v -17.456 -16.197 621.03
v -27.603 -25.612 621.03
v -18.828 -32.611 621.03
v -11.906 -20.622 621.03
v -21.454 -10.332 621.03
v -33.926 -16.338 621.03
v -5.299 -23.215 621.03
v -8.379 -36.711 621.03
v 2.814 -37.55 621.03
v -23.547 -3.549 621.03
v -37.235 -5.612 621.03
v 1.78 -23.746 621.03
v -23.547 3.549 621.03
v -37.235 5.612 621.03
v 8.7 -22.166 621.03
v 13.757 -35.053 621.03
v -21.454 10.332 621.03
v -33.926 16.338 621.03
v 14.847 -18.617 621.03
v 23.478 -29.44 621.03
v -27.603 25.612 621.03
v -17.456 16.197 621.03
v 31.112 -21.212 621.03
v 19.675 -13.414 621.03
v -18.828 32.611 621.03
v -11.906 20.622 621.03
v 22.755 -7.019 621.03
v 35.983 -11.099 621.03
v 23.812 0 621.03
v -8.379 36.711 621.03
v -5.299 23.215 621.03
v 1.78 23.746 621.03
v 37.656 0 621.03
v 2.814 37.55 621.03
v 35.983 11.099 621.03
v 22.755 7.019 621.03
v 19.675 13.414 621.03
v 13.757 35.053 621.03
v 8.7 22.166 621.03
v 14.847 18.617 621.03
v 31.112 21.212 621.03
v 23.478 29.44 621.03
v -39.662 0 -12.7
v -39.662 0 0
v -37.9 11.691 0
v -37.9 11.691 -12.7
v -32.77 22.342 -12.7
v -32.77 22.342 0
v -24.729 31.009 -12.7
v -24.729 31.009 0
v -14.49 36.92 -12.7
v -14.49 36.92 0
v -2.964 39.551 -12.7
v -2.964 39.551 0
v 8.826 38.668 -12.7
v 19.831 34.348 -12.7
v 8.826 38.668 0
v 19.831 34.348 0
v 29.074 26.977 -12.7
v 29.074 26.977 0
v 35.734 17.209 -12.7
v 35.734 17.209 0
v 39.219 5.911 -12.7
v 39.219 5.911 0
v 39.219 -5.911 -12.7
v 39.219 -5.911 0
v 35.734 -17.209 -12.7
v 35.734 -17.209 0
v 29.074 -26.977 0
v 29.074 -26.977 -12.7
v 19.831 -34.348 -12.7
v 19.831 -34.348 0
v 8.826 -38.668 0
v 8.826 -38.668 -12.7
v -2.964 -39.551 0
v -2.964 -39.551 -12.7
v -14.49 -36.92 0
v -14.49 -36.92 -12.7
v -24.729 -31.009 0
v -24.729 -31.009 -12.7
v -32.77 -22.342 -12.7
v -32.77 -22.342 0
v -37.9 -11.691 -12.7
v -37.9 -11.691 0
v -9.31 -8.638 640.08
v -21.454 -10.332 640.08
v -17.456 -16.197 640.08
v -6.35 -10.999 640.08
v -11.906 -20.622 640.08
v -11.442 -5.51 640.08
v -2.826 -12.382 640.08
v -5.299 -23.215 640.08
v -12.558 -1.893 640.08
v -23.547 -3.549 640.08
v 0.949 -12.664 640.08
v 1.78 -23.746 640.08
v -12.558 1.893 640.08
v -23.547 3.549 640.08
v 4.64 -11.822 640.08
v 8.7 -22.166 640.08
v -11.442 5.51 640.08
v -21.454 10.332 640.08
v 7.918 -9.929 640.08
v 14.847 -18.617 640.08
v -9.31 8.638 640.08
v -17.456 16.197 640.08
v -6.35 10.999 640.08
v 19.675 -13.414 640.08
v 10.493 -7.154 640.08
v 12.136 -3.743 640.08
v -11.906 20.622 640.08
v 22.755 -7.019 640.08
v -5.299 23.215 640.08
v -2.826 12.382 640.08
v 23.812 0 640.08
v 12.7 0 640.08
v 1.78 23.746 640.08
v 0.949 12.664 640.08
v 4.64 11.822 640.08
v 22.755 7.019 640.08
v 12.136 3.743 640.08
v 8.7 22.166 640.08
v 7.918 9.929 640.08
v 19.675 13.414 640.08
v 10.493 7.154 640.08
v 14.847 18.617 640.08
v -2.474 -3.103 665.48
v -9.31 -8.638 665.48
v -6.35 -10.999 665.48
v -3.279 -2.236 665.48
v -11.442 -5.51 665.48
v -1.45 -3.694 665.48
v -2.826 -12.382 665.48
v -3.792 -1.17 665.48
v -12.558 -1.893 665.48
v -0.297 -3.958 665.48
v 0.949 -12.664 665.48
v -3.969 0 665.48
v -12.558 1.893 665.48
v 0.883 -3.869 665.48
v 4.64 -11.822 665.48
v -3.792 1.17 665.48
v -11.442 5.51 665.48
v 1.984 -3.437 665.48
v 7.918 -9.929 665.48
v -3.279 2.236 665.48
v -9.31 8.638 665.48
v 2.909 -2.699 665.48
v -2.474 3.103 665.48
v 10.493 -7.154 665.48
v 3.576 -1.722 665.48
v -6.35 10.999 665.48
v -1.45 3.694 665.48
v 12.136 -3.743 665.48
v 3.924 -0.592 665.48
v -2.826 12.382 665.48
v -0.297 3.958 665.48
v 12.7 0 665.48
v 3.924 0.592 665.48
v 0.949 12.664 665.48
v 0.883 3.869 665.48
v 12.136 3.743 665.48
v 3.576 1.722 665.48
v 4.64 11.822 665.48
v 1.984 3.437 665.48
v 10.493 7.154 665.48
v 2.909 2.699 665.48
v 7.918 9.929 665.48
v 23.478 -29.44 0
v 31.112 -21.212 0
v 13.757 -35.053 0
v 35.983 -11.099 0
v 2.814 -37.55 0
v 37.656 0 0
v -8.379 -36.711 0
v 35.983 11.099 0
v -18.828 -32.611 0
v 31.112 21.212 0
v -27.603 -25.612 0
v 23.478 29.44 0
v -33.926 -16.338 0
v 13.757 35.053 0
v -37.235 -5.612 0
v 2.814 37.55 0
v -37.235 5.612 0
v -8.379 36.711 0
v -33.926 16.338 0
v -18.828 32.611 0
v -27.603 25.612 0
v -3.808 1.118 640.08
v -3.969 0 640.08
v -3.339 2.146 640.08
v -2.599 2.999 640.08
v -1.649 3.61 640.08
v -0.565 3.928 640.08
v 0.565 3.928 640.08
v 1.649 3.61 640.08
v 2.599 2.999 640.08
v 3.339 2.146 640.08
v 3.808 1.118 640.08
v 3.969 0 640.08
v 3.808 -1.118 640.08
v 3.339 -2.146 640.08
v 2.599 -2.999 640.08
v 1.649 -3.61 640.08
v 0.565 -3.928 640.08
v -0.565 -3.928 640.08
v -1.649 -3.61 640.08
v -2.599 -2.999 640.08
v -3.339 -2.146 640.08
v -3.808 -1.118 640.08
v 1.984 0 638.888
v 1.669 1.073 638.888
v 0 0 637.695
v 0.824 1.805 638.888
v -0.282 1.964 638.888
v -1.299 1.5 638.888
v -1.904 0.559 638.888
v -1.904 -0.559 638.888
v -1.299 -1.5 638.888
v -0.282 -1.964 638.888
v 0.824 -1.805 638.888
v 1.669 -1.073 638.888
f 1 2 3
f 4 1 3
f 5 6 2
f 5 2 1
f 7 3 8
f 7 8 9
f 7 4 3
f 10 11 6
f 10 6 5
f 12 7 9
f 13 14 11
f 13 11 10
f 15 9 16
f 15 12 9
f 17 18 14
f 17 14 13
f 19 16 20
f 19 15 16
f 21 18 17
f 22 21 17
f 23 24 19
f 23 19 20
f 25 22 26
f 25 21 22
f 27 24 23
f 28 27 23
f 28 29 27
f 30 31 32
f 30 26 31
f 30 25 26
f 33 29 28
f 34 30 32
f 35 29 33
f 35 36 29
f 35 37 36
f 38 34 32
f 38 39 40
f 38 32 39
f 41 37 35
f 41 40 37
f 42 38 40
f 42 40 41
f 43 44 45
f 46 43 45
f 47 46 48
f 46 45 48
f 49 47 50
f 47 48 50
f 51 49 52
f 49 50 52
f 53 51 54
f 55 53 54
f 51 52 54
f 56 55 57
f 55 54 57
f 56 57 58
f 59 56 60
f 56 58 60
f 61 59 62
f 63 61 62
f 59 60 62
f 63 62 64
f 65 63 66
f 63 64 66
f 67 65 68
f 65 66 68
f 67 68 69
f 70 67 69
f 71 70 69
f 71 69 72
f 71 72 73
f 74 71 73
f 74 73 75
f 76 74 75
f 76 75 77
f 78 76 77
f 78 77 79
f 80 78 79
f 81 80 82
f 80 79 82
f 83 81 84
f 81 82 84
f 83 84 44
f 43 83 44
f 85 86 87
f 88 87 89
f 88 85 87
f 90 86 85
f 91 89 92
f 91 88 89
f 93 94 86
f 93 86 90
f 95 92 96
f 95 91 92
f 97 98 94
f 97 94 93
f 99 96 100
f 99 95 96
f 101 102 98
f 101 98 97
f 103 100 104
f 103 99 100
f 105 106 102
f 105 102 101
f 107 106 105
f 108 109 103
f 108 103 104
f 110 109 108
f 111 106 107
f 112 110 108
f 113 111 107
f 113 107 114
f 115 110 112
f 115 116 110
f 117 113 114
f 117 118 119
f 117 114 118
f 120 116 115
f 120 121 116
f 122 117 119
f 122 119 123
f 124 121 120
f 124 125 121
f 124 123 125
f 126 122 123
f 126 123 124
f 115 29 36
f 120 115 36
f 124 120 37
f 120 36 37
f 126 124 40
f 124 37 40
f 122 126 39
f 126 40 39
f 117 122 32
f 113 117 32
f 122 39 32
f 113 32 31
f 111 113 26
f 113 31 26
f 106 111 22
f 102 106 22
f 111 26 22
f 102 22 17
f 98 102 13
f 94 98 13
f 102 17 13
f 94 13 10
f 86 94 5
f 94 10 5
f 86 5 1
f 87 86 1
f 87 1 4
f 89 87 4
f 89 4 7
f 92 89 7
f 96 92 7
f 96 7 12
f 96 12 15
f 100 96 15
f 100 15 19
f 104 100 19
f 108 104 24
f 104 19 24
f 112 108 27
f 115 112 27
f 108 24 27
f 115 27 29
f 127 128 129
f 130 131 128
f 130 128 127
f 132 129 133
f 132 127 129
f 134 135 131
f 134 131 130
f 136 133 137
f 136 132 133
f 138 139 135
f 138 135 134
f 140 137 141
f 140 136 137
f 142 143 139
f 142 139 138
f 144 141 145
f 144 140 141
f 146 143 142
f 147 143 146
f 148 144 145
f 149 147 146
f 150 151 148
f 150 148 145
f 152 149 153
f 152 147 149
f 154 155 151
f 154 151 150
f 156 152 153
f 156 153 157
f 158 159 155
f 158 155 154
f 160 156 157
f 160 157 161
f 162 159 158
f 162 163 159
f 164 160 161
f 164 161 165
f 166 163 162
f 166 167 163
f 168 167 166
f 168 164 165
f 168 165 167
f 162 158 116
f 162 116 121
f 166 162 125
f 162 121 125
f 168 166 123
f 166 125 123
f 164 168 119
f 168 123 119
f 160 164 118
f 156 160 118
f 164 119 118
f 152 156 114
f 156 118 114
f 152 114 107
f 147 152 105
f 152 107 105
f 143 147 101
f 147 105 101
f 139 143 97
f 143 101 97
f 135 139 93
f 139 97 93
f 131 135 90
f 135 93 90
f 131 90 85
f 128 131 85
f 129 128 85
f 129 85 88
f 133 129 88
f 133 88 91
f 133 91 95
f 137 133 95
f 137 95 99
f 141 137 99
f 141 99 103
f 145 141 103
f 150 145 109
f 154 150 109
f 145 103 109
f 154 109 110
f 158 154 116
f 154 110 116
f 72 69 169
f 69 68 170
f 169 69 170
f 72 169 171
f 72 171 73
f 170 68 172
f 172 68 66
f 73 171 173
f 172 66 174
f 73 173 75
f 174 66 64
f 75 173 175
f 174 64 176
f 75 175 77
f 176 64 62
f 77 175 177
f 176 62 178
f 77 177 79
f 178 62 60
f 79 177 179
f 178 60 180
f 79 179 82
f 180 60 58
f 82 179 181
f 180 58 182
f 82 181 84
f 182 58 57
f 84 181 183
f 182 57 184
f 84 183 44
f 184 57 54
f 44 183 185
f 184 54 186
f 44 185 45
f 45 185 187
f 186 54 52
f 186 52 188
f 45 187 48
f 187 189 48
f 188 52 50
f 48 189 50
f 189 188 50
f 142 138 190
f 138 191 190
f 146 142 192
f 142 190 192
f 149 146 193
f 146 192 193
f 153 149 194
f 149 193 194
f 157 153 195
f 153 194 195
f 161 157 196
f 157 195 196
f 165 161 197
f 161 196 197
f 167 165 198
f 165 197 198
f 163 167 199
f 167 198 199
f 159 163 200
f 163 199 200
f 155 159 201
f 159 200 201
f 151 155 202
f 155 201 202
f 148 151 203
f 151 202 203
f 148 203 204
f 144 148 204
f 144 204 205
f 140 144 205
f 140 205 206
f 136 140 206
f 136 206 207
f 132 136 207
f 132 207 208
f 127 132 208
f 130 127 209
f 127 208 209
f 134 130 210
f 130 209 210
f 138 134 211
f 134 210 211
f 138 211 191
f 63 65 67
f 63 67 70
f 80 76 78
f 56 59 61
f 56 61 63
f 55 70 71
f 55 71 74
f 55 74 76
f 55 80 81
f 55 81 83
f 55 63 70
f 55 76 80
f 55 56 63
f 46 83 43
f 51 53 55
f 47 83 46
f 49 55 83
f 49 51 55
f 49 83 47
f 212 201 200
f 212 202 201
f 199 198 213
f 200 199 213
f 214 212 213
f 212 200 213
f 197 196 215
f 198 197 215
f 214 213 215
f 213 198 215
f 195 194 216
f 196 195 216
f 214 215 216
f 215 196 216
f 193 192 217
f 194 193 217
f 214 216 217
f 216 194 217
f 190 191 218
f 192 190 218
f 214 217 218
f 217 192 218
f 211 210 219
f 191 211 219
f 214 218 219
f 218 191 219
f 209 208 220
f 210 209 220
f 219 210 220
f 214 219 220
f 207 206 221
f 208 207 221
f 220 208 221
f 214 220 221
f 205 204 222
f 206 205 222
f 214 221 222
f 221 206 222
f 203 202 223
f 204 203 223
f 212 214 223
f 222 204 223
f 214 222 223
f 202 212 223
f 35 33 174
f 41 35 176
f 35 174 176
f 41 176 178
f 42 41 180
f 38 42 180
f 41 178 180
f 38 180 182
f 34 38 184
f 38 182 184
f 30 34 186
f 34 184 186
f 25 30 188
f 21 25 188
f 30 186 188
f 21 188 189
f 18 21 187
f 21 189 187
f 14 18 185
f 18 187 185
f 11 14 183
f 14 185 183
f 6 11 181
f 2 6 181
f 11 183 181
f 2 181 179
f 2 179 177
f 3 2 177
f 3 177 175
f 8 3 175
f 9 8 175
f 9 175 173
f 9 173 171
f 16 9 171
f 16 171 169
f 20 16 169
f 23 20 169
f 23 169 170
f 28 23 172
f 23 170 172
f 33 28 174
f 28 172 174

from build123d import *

# Parameters (mm, degrees)
SKETCH1_R                   = 37.6555
BOSS_EXTRUDE1_DEPTH         = 621.03
SKETCH2_R                   = 39.6621
BOSS_EXTRUDE2_DEPTH         = 12.7
SKETCH4_R                   = 23.8125
BOSS_EXTRUDE4_DEPTH         = 19.05
SKETCH5_R                   = 12.7
BOSS_EXTRUDE5_DEPTH         = 25.4
F_3_8_16_TAPPED_HOLE1_D     = 7.9375
F_3_8_16_TAPPED_HOLE1_DEPTH = 25.4
F_3_8_16_TAPPED_HOLE1_TIP   = 2.384665582


with BuildPart() as part:
    # Sketch1 → Boss-Extrude1 (new body)
    with BuildSketch(Plane.XY):
        Circle(SKETCH1_R)
    extrude(amount=BOSS_EXTRUDE1_DEPTH)

    # Sketch2 → Boss-Extrude2 (add)
    with BuildSketch(Plane(origin=(0, 0, 0), x_dir=(-1, 0, 0), z_dir=(0, 0, -1))):
        Circle(SKETCH2_R)
    extrude(amount=BOSS_EXTRUDE2_DEPTH)

    # Sketch4 → Boss-Extrude4 (add)
    with BuildSketch(Plane.XY.offset(621.03)):
        Circle(SKETCH4_R)
    extrude(amount=BOSS_EXTRUDE4_DEPTH)

    # Sketch5 → Boss-Extrude5 (add)
    with BuildSketch(Plane.XY.offset(640.08)):
        Circle(SKETCH5_R)
    extrude(amount=BOSS_EXTRUDE5_DEPTH)

    # 3/8-16 Tapped Hole1
    with Locations(Plane.XY.offset(665.48)):
        with Locations((0, 0)):
            Hole(F_3_8_16_TAPPED_HOLE1_D / 2, depth=F_3_8_16_TAPPED_HOLE1_DEPTH)
            with Locations((0, 0, -(F_3_8_16_TAPPED_HOLE1_DEPTH + F_3_8_16_TAPPED_HOLE1_TIP / 2))):  # 118° drill point
                Cone(0, F_3_8_16_TAPPED_HOLE1_D / 2, F_3_8_16_TAPPED_HOLE1_TIP, mode=Mode.SUBTRACT)


solid = part.part
